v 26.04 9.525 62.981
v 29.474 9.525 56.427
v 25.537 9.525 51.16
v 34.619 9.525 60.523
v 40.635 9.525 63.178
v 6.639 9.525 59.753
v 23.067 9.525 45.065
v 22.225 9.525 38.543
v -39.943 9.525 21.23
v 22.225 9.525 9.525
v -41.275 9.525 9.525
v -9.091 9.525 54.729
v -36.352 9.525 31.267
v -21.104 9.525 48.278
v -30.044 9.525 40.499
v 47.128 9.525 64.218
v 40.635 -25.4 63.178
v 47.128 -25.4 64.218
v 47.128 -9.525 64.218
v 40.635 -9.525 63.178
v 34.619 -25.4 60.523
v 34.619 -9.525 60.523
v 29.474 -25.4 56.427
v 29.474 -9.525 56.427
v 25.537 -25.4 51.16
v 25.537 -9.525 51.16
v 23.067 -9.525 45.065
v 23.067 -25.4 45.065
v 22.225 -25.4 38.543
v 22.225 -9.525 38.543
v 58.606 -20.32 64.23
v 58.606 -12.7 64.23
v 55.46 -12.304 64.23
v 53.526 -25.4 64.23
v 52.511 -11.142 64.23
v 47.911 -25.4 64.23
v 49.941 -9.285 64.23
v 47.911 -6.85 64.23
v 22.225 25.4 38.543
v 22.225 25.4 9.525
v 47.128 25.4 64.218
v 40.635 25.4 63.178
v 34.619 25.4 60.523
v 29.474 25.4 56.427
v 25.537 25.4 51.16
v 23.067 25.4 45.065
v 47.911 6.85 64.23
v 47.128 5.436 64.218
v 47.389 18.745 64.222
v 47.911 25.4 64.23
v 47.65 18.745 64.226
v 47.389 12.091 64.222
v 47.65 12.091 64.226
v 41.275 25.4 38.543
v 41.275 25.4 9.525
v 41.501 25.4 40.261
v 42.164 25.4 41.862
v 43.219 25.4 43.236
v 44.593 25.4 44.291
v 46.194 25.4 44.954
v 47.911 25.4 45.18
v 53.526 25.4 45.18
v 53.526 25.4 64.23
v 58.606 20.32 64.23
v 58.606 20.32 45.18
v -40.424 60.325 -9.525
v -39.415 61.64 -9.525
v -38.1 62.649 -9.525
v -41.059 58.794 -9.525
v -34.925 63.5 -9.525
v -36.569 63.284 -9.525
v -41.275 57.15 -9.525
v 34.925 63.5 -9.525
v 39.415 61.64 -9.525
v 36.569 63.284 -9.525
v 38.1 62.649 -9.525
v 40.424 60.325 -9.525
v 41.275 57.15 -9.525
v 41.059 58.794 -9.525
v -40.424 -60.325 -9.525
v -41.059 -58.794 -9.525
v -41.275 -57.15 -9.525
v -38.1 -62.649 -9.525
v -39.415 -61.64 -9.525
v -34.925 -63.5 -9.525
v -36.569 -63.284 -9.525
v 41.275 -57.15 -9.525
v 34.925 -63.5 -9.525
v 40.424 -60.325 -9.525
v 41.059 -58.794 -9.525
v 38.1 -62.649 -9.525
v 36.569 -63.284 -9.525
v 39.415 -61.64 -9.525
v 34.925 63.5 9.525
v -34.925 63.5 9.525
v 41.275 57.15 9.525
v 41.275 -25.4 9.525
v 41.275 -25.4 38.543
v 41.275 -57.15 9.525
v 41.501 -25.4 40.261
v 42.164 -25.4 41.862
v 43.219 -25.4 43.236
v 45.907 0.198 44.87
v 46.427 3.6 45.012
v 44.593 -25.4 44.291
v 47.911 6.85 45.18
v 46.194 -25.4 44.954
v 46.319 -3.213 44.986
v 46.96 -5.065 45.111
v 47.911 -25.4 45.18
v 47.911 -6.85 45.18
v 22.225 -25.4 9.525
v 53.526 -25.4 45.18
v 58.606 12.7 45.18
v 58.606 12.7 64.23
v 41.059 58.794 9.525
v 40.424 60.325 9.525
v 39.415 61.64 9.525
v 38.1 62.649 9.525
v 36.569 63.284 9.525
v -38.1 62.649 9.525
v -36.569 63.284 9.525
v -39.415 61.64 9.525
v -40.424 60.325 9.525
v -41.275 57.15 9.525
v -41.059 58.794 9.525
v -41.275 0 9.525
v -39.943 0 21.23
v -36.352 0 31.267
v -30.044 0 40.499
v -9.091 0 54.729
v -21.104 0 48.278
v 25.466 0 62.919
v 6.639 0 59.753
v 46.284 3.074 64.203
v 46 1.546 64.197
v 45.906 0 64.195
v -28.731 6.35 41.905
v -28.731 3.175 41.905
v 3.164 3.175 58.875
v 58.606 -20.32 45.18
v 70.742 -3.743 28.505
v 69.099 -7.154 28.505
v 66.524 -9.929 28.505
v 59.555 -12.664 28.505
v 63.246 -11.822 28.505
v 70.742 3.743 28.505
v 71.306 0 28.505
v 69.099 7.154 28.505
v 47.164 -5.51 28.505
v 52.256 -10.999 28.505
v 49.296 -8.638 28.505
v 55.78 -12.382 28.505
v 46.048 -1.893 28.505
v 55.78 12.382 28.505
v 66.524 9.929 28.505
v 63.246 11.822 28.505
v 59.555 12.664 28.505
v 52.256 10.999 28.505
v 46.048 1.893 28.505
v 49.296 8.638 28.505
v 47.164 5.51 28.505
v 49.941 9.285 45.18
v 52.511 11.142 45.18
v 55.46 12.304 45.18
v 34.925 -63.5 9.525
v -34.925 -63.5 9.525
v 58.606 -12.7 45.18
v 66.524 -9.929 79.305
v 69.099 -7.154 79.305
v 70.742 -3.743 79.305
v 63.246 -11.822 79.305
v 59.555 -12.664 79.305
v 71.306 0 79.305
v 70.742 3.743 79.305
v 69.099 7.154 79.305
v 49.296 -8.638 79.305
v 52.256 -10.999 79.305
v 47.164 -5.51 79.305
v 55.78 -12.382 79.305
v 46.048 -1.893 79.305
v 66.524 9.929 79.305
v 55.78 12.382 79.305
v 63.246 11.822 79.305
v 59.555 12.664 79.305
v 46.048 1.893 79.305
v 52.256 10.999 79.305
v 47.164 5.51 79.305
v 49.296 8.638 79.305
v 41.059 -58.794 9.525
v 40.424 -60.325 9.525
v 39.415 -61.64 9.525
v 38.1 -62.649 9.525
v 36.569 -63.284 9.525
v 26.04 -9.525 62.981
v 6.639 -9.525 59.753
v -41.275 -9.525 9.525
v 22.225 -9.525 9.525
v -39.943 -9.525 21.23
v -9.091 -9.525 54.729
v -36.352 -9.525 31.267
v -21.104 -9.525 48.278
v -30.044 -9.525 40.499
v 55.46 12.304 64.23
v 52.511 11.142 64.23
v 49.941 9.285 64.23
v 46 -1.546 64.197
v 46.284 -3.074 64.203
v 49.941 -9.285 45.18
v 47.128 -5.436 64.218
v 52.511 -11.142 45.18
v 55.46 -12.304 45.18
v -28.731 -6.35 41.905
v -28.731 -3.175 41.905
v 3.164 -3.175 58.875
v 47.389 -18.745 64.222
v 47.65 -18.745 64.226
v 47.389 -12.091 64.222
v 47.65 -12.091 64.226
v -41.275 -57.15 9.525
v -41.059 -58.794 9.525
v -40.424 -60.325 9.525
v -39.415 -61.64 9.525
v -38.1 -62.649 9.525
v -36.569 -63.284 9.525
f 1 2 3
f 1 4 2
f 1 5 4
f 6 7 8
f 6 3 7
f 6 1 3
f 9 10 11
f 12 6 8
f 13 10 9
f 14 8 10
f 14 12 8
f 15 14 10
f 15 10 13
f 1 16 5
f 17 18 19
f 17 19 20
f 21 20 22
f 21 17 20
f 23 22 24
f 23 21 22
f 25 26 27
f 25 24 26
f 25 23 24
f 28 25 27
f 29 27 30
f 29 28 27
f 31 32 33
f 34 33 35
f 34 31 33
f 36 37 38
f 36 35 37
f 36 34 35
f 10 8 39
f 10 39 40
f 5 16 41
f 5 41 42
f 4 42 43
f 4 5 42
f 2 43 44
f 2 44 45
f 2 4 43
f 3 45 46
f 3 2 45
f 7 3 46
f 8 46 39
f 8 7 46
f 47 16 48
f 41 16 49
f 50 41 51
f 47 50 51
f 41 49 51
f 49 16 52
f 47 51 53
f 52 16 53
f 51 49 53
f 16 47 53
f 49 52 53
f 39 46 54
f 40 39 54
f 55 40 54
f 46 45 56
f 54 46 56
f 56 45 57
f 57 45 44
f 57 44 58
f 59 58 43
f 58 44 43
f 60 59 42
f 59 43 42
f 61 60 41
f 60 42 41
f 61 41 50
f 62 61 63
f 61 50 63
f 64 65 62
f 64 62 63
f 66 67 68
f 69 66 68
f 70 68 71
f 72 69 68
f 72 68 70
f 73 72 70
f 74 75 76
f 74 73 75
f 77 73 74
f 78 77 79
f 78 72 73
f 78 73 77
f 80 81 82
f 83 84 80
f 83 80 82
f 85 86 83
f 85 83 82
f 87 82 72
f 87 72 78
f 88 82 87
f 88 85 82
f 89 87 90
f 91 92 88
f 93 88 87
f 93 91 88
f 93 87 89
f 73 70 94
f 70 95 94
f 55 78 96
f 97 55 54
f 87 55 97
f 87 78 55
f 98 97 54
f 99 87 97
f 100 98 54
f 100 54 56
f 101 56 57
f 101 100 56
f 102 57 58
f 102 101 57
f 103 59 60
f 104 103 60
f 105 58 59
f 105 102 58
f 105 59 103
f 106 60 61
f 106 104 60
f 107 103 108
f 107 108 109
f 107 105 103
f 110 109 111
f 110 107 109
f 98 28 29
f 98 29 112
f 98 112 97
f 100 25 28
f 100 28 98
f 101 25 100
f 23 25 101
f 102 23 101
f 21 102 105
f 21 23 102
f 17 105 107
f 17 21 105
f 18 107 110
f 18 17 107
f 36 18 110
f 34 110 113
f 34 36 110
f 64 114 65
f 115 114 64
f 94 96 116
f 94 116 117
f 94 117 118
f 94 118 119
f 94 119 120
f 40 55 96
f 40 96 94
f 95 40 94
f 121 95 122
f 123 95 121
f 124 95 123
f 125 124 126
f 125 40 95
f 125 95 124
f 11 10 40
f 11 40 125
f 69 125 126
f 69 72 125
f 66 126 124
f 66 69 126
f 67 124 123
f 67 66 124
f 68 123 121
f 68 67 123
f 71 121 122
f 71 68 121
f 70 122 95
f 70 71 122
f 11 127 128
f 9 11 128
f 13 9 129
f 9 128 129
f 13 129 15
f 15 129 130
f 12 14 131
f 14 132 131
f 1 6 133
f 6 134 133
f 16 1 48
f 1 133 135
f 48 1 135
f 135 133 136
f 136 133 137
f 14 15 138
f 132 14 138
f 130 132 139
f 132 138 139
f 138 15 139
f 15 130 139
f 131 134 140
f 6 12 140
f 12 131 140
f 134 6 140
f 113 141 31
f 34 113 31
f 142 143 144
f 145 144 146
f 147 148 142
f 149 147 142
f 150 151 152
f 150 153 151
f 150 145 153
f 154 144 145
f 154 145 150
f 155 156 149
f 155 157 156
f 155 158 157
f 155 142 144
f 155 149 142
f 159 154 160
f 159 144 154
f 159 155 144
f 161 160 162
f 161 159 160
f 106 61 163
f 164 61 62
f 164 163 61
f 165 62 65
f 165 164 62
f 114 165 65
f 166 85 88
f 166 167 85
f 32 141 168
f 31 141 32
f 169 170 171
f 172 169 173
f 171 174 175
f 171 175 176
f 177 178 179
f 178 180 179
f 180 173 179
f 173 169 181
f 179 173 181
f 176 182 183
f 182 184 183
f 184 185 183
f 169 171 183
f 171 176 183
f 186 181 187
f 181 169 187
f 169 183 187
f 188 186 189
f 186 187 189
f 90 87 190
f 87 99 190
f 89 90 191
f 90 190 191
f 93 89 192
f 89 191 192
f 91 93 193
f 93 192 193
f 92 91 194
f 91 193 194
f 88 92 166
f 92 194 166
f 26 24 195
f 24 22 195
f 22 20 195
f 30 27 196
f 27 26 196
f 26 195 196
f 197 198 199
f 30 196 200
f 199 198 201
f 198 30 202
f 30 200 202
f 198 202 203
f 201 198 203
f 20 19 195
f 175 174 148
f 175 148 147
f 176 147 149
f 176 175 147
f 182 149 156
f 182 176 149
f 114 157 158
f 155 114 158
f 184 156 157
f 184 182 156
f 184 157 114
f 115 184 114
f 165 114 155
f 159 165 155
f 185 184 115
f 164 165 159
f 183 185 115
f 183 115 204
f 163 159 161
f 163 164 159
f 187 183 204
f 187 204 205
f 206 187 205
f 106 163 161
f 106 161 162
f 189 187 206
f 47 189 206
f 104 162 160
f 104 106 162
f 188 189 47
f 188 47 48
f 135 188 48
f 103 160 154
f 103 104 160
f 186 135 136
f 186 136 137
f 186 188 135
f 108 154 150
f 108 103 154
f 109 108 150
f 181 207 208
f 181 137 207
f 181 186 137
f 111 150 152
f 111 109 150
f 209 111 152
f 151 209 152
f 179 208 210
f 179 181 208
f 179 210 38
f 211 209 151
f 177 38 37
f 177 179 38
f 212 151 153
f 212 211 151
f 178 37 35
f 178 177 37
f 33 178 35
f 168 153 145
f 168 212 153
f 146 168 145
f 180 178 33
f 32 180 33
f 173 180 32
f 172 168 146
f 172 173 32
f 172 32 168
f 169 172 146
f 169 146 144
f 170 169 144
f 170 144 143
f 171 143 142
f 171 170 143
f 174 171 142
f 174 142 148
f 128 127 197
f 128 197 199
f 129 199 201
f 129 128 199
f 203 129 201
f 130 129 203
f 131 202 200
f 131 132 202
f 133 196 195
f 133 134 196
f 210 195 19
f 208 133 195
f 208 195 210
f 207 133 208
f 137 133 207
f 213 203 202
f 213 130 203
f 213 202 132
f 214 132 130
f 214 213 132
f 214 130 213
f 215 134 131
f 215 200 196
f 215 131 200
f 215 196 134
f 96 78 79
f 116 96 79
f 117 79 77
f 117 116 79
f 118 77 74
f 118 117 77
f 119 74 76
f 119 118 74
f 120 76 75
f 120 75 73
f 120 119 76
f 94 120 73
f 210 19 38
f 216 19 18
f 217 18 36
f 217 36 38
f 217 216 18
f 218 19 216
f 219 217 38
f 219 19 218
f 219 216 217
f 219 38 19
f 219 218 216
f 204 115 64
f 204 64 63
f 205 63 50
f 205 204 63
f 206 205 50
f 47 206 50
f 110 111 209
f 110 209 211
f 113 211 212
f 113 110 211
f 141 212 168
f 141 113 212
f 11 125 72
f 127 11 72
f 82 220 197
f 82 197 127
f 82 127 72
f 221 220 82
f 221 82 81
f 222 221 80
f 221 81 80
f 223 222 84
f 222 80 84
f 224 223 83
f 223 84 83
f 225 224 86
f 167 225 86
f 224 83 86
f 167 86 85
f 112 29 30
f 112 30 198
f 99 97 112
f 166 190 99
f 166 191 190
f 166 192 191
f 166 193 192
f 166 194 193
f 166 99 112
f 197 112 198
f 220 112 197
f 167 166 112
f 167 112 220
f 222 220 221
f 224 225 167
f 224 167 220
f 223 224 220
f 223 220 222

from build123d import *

# Parameters (mm, degrees)
F1_DEPTH = 63.5
F2_DEPTH = 25.4
F3_DEPTH = 9.525
F0_W     = 12.7
F0_H     = 19.05
F0_H_2   = 15.0751015409
F0_H_3   = 16.6748984591
F5_R     = 6.35
F6_SIZE  = 5.08


with BuildPart() as f1:
    # F0 (on Front) → F1 (new body, symmetric)
    with BuildSketch(Plane.XZ):
        Polygon((-41.275, -9.525), (41.275, -9.525), (41.275, 9.525), (22.225, 9.525), (-41.275, 9.525), align=None)
    extrude(amount=F1_DEPTH, both=True)

    # F0 (on Front) → F2 (join, symmetric)
    with BuildSketch(Plane.XZ):
        with BuildLine():
            Line((22.225, 9.525), (41.275, 9.525))
            Line((41.275, 9.525), (41.275, 38.5433479412))
            ThreePointArc((41.275, 38.5433479412), (43.2187539116, 43.2359849966), (47.911390967, 45.1797389083))
            Line((47.911390967, 45.1797389083), (58.6059387632, 45.1797389083))
            Line((58.6059387632, 45.1797389083), (58.6059387632, 64.2297389083))
            Line((58.6059387632, 64.2297389083), (47.911390967, 64.2297389083))
            add(Edge.make_bspline(
                [(47.1281210154, 64.2177937793), (47.3889968052, 64.2221283934), (47.6500885902, 64.2261091673), (47.911390967, 64.2297389083)],
                knots=[104.0564336435, 104.0564336435, 104.0564336435, 104.0564336435, 104.6270557397, 104.6270557397, 104.6270557397, 104.6270557397], degree=3))
            ThreePointArc((47.1281210154, 64.2177937793), (29.473521525, 56.4272974868), (22.225, 38.5433479412))
            Line((22.225, 38.5433479412), (22.225, 9.525))
        make_face()
    extrude(amount=F2_DEPTH, both=True)

    # F0 (on Front) → F3 (join, symmetric)
    with BuildSketch(Plane.XZ):
        with BuildLine():
            add(Edge.make_bspline(
                [(-41.275, 9.525), (-40.8338249741, 50.8703959556), (-0.4441768284, 63.4273503677), (47.1281210154, 64.2177937793)],
                knots=[0, 0, 0, 0, 104.0564336435, 104.0564336435, 104.0564336435, 104.0564336435], degree=3))
            Line((-41.275, 9.525), (22.225, 9.525))
            Line((22.225, 9.525), (22.225, 38.5433479412))
            ThreePointArc((22.225, 38.5433479412), (29.473521525, 56.4272974868), (47.1281210154, 64.2177937793))
        make_face()
    extrude(amount=F3_DEPTH, both=True)

    # F0 (on Front) → F4 (revolve)
    with BuildSketch(Plane.XZ):
        with Locations((64.9559387632, 54.7047389083)):
            Rectangle(F0_W, F0_H)
        with Locations((64.9559387632, 71.7672896787)):
            Rectangle(F0_W, F0_H_2)
        with Locations((64.9559387632, 36.8422896787)):
            Rectangle(F0_W, F0_H_3)
    revolve(axis=Axis((58.6059387632, 0, 53.9048404491), (0, 0, 1)))

    # F5
    f5_edges = [f1.edges().sort_by_distance(p)[0] for p in [
        (-41.275, -63.5, 0),
        (41.275, -63.5, 0),
        (-41.275, 63.5, 0),
        (41.275, 63.5, 0),
    ]]
    fillet(f5_edges, radius=F5_R)

    # F6
    f6_edges = [f1.edges().sort_by_distance(p)[0] for p in [
        (58.605939, -25.4, 54.704739),
        (58.605939, 25.4, 54.704739),
    ]]
    chamfer(f6_edges, length=F6_SIZE)


solid = f1.part
